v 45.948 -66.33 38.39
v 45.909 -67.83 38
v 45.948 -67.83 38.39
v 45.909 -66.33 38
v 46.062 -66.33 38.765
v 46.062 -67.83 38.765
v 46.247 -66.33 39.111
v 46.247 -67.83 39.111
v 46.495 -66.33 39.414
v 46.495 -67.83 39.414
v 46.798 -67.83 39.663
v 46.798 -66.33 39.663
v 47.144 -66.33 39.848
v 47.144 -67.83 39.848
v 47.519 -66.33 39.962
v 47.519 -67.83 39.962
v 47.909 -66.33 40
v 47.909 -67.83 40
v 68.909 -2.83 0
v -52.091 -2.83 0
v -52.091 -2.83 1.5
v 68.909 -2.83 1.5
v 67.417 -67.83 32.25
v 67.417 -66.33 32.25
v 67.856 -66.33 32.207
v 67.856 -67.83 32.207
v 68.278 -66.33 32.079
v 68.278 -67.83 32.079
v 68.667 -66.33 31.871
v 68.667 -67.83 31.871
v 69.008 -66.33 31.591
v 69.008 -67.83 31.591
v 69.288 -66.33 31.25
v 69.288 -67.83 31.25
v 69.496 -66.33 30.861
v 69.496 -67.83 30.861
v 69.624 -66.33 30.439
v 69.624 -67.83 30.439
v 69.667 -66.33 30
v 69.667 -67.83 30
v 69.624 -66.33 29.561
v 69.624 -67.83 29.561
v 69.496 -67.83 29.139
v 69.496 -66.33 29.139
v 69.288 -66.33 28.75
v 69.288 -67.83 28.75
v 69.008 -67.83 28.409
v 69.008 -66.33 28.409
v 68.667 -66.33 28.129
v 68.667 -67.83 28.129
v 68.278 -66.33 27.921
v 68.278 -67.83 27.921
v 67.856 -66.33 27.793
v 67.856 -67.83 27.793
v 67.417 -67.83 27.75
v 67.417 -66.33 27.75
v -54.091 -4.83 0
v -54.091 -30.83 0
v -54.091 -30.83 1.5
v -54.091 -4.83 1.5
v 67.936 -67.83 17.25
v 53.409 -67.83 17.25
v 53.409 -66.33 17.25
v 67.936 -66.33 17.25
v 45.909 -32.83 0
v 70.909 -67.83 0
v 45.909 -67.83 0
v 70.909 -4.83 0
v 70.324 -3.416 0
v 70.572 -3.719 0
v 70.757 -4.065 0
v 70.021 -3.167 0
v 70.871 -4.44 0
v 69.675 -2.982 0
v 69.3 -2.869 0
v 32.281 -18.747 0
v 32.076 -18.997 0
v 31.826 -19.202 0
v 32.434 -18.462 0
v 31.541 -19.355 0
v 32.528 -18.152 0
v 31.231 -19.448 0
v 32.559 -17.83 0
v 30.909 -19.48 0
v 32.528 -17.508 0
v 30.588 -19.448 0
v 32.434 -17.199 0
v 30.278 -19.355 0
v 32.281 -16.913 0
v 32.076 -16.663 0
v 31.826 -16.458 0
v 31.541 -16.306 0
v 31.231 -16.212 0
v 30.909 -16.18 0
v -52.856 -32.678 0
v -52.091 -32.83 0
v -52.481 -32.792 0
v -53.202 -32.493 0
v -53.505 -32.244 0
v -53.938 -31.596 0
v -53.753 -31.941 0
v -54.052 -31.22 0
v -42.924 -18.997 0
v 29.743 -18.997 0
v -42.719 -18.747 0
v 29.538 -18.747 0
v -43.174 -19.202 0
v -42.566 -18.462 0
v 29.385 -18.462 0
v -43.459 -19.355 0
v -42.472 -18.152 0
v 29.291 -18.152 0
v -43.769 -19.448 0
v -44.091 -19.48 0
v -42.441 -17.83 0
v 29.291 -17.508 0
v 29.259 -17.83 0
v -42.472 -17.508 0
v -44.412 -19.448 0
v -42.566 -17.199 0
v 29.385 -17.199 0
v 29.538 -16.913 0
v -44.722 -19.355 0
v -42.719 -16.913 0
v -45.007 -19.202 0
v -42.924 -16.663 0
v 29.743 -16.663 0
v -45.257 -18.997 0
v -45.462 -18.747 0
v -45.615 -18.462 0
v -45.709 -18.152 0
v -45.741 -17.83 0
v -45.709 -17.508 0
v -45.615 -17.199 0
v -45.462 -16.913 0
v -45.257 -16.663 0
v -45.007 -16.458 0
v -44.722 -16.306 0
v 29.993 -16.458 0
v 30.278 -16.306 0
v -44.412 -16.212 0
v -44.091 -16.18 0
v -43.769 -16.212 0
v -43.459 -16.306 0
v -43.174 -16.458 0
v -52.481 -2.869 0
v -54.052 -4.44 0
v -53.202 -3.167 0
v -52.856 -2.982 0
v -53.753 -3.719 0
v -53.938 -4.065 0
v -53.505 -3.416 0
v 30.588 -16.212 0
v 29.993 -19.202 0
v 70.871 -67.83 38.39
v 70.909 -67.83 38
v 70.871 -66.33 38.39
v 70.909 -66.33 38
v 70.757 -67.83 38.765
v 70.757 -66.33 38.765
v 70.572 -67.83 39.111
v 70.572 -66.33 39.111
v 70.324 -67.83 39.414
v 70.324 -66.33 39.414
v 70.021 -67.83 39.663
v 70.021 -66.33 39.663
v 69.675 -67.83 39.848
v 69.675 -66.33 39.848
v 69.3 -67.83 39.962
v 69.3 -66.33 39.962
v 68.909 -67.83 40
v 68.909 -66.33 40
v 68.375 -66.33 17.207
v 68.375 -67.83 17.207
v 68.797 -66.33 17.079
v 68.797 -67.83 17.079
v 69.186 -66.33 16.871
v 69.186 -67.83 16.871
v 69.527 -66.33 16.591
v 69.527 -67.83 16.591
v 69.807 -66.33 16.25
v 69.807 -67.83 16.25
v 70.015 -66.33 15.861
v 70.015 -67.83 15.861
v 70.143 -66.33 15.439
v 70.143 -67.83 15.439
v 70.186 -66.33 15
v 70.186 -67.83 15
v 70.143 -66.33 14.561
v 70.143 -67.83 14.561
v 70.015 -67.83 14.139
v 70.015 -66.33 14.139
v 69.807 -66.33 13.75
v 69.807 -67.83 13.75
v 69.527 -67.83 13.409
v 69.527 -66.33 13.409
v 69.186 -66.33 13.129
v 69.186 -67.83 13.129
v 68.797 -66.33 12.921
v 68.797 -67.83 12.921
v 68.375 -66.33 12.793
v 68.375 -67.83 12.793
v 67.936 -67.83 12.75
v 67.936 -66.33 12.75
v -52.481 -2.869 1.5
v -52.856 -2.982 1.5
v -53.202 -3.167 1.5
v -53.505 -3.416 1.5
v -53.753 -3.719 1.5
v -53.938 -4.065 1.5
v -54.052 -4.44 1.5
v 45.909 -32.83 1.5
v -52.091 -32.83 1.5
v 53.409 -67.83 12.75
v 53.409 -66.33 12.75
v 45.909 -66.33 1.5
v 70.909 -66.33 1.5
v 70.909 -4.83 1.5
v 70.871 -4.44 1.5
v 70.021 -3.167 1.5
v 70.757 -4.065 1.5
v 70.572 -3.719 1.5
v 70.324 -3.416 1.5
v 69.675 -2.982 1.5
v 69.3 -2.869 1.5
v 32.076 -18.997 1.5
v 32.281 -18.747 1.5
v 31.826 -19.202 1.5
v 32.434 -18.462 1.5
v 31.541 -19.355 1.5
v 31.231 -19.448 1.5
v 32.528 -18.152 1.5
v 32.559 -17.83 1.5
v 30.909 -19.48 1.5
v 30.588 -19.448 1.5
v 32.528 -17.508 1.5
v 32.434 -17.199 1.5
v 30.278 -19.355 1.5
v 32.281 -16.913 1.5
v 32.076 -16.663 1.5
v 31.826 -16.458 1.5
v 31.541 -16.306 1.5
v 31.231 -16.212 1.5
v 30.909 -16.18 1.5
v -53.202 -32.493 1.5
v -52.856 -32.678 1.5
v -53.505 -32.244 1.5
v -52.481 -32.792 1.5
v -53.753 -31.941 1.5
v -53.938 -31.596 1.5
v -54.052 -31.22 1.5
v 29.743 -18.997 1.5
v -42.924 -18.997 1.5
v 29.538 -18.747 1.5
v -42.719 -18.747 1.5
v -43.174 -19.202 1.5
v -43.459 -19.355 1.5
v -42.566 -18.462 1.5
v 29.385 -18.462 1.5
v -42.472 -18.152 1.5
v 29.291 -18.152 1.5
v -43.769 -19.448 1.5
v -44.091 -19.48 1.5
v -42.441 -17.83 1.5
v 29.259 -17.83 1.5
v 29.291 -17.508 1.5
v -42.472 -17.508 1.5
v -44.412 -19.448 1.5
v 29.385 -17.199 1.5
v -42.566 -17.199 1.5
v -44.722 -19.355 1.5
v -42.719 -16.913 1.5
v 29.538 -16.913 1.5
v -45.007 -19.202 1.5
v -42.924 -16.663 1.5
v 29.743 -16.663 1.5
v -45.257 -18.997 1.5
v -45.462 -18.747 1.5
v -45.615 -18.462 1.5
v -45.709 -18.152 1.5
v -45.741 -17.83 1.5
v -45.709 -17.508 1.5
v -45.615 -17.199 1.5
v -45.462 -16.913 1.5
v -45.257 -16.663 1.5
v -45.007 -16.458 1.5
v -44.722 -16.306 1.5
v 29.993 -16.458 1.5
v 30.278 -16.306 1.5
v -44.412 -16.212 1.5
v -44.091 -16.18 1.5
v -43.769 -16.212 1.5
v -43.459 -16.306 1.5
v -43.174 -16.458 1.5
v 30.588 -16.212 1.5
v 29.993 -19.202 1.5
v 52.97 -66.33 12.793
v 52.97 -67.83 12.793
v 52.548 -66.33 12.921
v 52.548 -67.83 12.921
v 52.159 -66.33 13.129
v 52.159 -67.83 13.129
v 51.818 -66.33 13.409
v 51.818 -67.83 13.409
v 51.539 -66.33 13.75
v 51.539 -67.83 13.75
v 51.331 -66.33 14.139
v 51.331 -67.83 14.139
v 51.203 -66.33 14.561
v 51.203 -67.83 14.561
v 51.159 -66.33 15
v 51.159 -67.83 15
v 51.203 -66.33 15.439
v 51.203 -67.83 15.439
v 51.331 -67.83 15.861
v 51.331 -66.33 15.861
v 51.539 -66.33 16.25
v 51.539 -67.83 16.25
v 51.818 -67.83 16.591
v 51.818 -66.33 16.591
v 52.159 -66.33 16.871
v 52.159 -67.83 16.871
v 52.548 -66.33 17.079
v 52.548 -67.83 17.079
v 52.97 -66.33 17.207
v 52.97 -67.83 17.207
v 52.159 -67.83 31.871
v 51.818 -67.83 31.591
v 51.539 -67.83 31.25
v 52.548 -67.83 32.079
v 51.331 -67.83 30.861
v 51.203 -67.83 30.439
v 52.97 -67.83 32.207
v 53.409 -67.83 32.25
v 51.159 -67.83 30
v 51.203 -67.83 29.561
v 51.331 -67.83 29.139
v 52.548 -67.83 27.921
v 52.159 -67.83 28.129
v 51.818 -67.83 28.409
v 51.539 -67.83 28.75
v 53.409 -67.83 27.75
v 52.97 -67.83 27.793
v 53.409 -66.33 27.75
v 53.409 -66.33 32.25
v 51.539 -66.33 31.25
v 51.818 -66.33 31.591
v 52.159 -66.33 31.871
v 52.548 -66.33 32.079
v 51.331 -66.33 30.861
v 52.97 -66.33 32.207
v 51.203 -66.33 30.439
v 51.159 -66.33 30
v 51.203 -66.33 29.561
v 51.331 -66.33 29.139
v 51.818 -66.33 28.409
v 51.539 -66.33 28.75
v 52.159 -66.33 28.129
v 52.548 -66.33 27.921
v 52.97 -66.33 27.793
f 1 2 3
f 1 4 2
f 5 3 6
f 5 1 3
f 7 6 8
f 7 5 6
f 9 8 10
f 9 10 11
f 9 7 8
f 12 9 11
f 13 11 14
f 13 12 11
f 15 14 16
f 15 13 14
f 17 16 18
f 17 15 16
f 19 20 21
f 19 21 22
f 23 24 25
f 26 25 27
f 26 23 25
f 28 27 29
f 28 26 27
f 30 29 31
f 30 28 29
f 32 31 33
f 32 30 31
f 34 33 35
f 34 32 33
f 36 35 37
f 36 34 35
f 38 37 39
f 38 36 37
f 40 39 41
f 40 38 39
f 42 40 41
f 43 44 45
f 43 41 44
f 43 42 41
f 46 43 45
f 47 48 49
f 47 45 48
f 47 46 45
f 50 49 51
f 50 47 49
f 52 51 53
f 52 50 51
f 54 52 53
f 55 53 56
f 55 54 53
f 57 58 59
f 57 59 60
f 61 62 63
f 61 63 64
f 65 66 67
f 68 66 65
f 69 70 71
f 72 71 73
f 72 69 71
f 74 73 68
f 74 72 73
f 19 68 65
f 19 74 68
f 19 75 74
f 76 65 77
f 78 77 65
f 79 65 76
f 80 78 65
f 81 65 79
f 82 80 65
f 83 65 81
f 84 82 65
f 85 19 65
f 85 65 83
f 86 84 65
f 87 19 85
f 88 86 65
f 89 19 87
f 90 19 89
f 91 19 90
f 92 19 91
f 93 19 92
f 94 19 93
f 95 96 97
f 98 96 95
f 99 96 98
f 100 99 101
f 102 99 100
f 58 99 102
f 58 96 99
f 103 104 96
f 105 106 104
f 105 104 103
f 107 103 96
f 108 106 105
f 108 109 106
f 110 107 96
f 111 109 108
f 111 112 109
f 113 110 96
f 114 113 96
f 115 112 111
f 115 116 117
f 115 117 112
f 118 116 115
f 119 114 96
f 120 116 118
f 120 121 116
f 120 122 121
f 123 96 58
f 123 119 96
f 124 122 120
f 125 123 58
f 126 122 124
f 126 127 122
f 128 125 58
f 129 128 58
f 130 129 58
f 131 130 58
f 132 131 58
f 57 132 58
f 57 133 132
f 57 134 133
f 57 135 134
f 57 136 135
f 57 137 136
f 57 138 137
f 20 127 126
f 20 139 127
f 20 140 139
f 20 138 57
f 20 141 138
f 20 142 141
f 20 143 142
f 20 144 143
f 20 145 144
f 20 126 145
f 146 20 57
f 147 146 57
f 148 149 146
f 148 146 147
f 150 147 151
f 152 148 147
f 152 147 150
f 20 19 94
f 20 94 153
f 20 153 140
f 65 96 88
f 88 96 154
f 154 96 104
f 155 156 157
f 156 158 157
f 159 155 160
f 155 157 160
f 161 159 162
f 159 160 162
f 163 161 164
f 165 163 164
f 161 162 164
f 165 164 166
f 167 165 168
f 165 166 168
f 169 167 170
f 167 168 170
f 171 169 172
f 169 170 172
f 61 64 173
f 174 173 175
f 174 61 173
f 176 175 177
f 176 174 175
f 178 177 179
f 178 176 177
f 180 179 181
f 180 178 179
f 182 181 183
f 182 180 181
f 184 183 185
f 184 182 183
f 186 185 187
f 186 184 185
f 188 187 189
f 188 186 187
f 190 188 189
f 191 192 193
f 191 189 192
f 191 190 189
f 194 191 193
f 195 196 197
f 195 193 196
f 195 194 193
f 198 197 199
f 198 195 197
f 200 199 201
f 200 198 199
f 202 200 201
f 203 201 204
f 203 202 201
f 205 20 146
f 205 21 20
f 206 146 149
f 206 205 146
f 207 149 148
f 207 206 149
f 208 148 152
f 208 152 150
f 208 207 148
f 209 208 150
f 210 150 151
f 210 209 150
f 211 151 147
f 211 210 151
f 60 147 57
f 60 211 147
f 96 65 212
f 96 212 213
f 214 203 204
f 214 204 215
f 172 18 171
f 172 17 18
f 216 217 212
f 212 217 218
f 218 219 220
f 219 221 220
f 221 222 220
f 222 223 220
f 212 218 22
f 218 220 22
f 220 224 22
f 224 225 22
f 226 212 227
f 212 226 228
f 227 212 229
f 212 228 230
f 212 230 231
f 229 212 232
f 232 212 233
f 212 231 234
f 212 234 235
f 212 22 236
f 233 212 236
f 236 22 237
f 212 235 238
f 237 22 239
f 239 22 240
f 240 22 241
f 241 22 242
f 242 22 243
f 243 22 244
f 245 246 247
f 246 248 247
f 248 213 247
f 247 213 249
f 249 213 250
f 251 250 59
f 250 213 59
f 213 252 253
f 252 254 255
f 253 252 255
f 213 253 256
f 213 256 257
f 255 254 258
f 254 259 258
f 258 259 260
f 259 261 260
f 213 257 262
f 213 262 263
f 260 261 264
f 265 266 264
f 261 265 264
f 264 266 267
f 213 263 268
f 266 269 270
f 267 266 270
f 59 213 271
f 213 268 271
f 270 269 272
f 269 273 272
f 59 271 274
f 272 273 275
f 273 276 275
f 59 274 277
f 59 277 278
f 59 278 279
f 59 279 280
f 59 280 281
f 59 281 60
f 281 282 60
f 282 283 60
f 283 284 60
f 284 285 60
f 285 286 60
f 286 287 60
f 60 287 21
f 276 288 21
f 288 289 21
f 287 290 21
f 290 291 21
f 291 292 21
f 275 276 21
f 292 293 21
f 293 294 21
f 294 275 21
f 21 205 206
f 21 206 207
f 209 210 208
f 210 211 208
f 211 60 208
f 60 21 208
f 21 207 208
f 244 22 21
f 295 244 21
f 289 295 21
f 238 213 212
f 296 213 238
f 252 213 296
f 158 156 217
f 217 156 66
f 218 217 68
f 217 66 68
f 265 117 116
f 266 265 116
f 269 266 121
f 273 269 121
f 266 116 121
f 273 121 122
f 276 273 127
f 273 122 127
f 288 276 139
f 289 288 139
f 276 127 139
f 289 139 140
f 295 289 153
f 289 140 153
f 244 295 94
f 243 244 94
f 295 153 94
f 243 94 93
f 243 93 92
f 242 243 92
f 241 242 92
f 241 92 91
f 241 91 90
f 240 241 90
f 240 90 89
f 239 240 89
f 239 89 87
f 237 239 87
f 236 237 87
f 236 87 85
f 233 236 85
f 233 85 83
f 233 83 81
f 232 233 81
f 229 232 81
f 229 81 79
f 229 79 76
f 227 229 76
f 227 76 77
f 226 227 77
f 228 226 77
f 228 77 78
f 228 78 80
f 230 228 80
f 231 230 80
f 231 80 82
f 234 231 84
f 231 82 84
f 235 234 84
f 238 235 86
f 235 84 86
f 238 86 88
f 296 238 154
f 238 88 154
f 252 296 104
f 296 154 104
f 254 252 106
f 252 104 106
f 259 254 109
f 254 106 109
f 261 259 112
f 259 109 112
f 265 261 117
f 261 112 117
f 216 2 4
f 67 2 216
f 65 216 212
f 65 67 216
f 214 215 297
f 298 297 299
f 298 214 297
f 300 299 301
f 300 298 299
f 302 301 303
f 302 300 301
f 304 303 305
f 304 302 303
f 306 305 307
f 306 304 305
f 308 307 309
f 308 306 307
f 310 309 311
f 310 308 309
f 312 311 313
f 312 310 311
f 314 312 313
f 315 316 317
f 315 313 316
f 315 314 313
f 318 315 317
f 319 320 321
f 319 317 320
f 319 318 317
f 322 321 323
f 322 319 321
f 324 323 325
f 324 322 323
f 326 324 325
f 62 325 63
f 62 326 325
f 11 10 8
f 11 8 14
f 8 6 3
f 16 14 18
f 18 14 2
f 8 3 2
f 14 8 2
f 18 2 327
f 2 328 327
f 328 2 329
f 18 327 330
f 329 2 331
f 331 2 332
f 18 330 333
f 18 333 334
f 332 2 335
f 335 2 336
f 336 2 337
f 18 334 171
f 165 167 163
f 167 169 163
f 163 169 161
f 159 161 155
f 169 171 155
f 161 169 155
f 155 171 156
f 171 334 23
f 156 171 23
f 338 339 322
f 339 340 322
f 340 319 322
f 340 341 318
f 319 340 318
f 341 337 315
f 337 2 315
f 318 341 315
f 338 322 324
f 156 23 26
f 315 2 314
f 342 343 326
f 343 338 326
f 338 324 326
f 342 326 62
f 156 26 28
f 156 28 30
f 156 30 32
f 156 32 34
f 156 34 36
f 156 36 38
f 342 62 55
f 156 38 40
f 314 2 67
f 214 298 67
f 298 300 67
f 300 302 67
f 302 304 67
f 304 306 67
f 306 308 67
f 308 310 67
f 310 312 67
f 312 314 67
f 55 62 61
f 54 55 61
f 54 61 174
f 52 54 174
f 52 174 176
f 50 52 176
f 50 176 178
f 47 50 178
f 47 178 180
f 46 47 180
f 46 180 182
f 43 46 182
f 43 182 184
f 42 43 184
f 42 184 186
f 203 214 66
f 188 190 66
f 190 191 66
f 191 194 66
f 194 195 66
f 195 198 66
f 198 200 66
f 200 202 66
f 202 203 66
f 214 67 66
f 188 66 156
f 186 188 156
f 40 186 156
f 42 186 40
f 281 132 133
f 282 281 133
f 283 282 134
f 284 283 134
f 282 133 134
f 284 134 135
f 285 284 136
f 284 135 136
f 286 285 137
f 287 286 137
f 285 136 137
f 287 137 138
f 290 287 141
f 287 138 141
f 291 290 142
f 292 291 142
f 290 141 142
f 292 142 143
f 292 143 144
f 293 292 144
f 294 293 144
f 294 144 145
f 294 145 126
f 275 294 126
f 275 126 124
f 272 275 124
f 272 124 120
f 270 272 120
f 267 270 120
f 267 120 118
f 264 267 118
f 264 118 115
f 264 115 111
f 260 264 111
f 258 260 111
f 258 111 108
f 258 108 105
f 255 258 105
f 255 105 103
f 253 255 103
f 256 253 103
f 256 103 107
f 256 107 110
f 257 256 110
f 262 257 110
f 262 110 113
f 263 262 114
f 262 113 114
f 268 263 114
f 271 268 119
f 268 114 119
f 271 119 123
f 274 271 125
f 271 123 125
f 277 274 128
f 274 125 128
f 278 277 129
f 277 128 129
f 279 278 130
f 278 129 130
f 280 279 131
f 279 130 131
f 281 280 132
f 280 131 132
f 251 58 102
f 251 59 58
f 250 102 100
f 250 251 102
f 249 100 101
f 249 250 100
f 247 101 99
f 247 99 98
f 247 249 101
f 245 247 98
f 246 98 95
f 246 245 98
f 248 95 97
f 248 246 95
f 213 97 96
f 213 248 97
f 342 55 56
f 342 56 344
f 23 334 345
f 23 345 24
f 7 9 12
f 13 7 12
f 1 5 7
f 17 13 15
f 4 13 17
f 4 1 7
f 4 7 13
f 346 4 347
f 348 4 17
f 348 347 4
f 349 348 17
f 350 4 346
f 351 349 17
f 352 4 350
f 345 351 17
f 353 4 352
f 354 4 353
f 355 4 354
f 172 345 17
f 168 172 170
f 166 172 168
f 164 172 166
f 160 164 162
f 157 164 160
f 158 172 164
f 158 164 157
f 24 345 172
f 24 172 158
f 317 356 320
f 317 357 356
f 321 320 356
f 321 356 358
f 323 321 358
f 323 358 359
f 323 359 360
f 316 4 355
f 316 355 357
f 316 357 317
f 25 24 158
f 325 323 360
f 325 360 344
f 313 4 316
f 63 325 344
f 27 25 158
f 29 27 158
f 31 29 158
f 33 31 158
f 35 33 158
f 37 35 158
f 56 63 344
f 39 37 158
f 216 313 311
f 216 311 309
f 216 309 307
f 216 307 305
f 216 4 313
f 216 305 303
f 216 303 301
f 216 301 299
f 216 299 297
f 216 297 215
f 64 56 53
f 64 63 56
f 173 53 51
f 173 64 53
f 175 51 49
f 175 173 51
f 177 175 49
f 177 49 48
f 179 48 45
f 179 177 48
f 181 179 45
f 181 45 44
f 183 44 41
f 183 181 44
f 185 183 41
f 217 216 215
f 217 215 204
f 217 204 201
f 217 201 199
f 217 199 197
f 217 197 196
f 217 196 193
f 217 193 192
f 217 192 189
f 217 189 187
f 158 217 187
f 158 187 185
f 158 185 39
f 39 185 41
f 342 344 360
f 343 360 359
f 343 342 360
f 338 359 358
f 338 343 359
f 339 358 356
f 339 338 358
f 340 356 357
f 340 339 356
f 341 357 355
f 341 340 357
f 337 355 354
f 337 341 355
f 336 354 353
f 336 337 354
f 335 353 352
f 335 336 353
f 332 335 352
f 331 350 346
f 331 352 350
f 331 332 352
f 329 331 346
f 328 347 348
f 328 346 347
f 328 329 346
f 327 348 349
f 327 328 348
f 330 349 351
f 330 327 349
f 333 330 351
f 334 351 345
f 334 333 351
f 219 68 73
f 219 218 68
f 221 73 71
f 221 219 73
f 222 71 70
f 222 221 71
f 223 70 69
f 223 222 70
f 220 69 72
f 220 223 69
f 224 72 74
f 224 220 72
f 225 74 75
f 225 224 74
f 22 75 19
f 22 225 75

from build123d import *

# Parameters (mm, degrees)
BOSS_EXTRUDE1_DEPTH   = 1.5
SKETCH2_W             = 25
SKETCH2_H             = 1.5
BOSS_EXTRUDE2_DEPTH   = 38.5
FILLET1_R             = 2
CUT_EXTRUDE1_DEPTH    = 38.5
M4X0_7_TAPPED_HOLE1_D = 3.3


with BuildPart() as part:
    # Sketch1 → Boss-Extrude1 (new body)
    with BuildSketch(Plane.XY):
        Polygon((-54.090560102, -2.830140877), (70.909439898, -2.830140877), (70.909439898, -67.830140877), (45.909439898, -67.830140877), (45.909439898, -32.830140877), (-54.090560102, -32.830140877), align=None)
    extrude(amount=BOSS_EXTRUDE1_DEPTH)

    # Sketch2 → Boss-Extrude2 (add)
    with BuildSketch(Plane.XY.offset(1.5)):
        with Locations((58.409439898, -67.080140877)):
            Rectangle(SKETCH2_W, SKETCH2_H)
    extrude(amount=BOSS_EXTRUDE2_DEPTH)

    # Fillet1
    fillet1_edges = [part.edges().sort_by_distance(p)[0] for p in [
        (-54.090560102, -2.830140877, 0.75),
        (70.909439898, -2.830140877, 0.75),
        (-54.090560102, -32.830140877, 0.75),
        (45.909439898, -67.080140877, 40),
        (70.909439898, -67.080140877, 40),
    ]]
    fillet(fillet1_edges, radius=FILLET1_R)

    # Sketch3 → Cut-Extrude1 (cut)
    with BuildSketch(Plane.XZ.offset(67.830140877)):
        with BuildLine():
            Line((53.409439898, 32.25), (67.417341478, 32.25))
            ThreePointArc((67.417341478, 32.25), (69.667341478, 30), (67.417341478, 27.75))
            Line((67.417341478, 27.75), (53.409439898, 27.75))
            ThreePointArc((53.409439898, 27.75), (51.159439898, 30), (53.409439898, 32.25))
        make_face()
        with BuildLine():
            Line((67.936439633, 12.75), (53.409439898, 12.75))
            ThreePointArc((53.409439898, 12.75), (51.159439898, 15), (53.409439898, 17.25))
            Line((53.409439898, 17.25), (67.936439633, 17.25))
            ThreePointArc((67.936439633, 17.25), (70.186439633, 15), (67.936439633, 12.75))
        make_face()
    extrude(amount=-CUT_EXTRUDE1_DEPTH, mode=Mode.SUBTRACT)

    # M4x0.7 Tapped Hole1 (through all)
    with Locations(Plane.XY.offset(1.5)):
        with Locations((-44.090560102, -17.830140877), (30.909439898, -17.830140877)):
            Hole(M4X0_7_TAPPED_HOLE1_D / 2)


solid = part.part
